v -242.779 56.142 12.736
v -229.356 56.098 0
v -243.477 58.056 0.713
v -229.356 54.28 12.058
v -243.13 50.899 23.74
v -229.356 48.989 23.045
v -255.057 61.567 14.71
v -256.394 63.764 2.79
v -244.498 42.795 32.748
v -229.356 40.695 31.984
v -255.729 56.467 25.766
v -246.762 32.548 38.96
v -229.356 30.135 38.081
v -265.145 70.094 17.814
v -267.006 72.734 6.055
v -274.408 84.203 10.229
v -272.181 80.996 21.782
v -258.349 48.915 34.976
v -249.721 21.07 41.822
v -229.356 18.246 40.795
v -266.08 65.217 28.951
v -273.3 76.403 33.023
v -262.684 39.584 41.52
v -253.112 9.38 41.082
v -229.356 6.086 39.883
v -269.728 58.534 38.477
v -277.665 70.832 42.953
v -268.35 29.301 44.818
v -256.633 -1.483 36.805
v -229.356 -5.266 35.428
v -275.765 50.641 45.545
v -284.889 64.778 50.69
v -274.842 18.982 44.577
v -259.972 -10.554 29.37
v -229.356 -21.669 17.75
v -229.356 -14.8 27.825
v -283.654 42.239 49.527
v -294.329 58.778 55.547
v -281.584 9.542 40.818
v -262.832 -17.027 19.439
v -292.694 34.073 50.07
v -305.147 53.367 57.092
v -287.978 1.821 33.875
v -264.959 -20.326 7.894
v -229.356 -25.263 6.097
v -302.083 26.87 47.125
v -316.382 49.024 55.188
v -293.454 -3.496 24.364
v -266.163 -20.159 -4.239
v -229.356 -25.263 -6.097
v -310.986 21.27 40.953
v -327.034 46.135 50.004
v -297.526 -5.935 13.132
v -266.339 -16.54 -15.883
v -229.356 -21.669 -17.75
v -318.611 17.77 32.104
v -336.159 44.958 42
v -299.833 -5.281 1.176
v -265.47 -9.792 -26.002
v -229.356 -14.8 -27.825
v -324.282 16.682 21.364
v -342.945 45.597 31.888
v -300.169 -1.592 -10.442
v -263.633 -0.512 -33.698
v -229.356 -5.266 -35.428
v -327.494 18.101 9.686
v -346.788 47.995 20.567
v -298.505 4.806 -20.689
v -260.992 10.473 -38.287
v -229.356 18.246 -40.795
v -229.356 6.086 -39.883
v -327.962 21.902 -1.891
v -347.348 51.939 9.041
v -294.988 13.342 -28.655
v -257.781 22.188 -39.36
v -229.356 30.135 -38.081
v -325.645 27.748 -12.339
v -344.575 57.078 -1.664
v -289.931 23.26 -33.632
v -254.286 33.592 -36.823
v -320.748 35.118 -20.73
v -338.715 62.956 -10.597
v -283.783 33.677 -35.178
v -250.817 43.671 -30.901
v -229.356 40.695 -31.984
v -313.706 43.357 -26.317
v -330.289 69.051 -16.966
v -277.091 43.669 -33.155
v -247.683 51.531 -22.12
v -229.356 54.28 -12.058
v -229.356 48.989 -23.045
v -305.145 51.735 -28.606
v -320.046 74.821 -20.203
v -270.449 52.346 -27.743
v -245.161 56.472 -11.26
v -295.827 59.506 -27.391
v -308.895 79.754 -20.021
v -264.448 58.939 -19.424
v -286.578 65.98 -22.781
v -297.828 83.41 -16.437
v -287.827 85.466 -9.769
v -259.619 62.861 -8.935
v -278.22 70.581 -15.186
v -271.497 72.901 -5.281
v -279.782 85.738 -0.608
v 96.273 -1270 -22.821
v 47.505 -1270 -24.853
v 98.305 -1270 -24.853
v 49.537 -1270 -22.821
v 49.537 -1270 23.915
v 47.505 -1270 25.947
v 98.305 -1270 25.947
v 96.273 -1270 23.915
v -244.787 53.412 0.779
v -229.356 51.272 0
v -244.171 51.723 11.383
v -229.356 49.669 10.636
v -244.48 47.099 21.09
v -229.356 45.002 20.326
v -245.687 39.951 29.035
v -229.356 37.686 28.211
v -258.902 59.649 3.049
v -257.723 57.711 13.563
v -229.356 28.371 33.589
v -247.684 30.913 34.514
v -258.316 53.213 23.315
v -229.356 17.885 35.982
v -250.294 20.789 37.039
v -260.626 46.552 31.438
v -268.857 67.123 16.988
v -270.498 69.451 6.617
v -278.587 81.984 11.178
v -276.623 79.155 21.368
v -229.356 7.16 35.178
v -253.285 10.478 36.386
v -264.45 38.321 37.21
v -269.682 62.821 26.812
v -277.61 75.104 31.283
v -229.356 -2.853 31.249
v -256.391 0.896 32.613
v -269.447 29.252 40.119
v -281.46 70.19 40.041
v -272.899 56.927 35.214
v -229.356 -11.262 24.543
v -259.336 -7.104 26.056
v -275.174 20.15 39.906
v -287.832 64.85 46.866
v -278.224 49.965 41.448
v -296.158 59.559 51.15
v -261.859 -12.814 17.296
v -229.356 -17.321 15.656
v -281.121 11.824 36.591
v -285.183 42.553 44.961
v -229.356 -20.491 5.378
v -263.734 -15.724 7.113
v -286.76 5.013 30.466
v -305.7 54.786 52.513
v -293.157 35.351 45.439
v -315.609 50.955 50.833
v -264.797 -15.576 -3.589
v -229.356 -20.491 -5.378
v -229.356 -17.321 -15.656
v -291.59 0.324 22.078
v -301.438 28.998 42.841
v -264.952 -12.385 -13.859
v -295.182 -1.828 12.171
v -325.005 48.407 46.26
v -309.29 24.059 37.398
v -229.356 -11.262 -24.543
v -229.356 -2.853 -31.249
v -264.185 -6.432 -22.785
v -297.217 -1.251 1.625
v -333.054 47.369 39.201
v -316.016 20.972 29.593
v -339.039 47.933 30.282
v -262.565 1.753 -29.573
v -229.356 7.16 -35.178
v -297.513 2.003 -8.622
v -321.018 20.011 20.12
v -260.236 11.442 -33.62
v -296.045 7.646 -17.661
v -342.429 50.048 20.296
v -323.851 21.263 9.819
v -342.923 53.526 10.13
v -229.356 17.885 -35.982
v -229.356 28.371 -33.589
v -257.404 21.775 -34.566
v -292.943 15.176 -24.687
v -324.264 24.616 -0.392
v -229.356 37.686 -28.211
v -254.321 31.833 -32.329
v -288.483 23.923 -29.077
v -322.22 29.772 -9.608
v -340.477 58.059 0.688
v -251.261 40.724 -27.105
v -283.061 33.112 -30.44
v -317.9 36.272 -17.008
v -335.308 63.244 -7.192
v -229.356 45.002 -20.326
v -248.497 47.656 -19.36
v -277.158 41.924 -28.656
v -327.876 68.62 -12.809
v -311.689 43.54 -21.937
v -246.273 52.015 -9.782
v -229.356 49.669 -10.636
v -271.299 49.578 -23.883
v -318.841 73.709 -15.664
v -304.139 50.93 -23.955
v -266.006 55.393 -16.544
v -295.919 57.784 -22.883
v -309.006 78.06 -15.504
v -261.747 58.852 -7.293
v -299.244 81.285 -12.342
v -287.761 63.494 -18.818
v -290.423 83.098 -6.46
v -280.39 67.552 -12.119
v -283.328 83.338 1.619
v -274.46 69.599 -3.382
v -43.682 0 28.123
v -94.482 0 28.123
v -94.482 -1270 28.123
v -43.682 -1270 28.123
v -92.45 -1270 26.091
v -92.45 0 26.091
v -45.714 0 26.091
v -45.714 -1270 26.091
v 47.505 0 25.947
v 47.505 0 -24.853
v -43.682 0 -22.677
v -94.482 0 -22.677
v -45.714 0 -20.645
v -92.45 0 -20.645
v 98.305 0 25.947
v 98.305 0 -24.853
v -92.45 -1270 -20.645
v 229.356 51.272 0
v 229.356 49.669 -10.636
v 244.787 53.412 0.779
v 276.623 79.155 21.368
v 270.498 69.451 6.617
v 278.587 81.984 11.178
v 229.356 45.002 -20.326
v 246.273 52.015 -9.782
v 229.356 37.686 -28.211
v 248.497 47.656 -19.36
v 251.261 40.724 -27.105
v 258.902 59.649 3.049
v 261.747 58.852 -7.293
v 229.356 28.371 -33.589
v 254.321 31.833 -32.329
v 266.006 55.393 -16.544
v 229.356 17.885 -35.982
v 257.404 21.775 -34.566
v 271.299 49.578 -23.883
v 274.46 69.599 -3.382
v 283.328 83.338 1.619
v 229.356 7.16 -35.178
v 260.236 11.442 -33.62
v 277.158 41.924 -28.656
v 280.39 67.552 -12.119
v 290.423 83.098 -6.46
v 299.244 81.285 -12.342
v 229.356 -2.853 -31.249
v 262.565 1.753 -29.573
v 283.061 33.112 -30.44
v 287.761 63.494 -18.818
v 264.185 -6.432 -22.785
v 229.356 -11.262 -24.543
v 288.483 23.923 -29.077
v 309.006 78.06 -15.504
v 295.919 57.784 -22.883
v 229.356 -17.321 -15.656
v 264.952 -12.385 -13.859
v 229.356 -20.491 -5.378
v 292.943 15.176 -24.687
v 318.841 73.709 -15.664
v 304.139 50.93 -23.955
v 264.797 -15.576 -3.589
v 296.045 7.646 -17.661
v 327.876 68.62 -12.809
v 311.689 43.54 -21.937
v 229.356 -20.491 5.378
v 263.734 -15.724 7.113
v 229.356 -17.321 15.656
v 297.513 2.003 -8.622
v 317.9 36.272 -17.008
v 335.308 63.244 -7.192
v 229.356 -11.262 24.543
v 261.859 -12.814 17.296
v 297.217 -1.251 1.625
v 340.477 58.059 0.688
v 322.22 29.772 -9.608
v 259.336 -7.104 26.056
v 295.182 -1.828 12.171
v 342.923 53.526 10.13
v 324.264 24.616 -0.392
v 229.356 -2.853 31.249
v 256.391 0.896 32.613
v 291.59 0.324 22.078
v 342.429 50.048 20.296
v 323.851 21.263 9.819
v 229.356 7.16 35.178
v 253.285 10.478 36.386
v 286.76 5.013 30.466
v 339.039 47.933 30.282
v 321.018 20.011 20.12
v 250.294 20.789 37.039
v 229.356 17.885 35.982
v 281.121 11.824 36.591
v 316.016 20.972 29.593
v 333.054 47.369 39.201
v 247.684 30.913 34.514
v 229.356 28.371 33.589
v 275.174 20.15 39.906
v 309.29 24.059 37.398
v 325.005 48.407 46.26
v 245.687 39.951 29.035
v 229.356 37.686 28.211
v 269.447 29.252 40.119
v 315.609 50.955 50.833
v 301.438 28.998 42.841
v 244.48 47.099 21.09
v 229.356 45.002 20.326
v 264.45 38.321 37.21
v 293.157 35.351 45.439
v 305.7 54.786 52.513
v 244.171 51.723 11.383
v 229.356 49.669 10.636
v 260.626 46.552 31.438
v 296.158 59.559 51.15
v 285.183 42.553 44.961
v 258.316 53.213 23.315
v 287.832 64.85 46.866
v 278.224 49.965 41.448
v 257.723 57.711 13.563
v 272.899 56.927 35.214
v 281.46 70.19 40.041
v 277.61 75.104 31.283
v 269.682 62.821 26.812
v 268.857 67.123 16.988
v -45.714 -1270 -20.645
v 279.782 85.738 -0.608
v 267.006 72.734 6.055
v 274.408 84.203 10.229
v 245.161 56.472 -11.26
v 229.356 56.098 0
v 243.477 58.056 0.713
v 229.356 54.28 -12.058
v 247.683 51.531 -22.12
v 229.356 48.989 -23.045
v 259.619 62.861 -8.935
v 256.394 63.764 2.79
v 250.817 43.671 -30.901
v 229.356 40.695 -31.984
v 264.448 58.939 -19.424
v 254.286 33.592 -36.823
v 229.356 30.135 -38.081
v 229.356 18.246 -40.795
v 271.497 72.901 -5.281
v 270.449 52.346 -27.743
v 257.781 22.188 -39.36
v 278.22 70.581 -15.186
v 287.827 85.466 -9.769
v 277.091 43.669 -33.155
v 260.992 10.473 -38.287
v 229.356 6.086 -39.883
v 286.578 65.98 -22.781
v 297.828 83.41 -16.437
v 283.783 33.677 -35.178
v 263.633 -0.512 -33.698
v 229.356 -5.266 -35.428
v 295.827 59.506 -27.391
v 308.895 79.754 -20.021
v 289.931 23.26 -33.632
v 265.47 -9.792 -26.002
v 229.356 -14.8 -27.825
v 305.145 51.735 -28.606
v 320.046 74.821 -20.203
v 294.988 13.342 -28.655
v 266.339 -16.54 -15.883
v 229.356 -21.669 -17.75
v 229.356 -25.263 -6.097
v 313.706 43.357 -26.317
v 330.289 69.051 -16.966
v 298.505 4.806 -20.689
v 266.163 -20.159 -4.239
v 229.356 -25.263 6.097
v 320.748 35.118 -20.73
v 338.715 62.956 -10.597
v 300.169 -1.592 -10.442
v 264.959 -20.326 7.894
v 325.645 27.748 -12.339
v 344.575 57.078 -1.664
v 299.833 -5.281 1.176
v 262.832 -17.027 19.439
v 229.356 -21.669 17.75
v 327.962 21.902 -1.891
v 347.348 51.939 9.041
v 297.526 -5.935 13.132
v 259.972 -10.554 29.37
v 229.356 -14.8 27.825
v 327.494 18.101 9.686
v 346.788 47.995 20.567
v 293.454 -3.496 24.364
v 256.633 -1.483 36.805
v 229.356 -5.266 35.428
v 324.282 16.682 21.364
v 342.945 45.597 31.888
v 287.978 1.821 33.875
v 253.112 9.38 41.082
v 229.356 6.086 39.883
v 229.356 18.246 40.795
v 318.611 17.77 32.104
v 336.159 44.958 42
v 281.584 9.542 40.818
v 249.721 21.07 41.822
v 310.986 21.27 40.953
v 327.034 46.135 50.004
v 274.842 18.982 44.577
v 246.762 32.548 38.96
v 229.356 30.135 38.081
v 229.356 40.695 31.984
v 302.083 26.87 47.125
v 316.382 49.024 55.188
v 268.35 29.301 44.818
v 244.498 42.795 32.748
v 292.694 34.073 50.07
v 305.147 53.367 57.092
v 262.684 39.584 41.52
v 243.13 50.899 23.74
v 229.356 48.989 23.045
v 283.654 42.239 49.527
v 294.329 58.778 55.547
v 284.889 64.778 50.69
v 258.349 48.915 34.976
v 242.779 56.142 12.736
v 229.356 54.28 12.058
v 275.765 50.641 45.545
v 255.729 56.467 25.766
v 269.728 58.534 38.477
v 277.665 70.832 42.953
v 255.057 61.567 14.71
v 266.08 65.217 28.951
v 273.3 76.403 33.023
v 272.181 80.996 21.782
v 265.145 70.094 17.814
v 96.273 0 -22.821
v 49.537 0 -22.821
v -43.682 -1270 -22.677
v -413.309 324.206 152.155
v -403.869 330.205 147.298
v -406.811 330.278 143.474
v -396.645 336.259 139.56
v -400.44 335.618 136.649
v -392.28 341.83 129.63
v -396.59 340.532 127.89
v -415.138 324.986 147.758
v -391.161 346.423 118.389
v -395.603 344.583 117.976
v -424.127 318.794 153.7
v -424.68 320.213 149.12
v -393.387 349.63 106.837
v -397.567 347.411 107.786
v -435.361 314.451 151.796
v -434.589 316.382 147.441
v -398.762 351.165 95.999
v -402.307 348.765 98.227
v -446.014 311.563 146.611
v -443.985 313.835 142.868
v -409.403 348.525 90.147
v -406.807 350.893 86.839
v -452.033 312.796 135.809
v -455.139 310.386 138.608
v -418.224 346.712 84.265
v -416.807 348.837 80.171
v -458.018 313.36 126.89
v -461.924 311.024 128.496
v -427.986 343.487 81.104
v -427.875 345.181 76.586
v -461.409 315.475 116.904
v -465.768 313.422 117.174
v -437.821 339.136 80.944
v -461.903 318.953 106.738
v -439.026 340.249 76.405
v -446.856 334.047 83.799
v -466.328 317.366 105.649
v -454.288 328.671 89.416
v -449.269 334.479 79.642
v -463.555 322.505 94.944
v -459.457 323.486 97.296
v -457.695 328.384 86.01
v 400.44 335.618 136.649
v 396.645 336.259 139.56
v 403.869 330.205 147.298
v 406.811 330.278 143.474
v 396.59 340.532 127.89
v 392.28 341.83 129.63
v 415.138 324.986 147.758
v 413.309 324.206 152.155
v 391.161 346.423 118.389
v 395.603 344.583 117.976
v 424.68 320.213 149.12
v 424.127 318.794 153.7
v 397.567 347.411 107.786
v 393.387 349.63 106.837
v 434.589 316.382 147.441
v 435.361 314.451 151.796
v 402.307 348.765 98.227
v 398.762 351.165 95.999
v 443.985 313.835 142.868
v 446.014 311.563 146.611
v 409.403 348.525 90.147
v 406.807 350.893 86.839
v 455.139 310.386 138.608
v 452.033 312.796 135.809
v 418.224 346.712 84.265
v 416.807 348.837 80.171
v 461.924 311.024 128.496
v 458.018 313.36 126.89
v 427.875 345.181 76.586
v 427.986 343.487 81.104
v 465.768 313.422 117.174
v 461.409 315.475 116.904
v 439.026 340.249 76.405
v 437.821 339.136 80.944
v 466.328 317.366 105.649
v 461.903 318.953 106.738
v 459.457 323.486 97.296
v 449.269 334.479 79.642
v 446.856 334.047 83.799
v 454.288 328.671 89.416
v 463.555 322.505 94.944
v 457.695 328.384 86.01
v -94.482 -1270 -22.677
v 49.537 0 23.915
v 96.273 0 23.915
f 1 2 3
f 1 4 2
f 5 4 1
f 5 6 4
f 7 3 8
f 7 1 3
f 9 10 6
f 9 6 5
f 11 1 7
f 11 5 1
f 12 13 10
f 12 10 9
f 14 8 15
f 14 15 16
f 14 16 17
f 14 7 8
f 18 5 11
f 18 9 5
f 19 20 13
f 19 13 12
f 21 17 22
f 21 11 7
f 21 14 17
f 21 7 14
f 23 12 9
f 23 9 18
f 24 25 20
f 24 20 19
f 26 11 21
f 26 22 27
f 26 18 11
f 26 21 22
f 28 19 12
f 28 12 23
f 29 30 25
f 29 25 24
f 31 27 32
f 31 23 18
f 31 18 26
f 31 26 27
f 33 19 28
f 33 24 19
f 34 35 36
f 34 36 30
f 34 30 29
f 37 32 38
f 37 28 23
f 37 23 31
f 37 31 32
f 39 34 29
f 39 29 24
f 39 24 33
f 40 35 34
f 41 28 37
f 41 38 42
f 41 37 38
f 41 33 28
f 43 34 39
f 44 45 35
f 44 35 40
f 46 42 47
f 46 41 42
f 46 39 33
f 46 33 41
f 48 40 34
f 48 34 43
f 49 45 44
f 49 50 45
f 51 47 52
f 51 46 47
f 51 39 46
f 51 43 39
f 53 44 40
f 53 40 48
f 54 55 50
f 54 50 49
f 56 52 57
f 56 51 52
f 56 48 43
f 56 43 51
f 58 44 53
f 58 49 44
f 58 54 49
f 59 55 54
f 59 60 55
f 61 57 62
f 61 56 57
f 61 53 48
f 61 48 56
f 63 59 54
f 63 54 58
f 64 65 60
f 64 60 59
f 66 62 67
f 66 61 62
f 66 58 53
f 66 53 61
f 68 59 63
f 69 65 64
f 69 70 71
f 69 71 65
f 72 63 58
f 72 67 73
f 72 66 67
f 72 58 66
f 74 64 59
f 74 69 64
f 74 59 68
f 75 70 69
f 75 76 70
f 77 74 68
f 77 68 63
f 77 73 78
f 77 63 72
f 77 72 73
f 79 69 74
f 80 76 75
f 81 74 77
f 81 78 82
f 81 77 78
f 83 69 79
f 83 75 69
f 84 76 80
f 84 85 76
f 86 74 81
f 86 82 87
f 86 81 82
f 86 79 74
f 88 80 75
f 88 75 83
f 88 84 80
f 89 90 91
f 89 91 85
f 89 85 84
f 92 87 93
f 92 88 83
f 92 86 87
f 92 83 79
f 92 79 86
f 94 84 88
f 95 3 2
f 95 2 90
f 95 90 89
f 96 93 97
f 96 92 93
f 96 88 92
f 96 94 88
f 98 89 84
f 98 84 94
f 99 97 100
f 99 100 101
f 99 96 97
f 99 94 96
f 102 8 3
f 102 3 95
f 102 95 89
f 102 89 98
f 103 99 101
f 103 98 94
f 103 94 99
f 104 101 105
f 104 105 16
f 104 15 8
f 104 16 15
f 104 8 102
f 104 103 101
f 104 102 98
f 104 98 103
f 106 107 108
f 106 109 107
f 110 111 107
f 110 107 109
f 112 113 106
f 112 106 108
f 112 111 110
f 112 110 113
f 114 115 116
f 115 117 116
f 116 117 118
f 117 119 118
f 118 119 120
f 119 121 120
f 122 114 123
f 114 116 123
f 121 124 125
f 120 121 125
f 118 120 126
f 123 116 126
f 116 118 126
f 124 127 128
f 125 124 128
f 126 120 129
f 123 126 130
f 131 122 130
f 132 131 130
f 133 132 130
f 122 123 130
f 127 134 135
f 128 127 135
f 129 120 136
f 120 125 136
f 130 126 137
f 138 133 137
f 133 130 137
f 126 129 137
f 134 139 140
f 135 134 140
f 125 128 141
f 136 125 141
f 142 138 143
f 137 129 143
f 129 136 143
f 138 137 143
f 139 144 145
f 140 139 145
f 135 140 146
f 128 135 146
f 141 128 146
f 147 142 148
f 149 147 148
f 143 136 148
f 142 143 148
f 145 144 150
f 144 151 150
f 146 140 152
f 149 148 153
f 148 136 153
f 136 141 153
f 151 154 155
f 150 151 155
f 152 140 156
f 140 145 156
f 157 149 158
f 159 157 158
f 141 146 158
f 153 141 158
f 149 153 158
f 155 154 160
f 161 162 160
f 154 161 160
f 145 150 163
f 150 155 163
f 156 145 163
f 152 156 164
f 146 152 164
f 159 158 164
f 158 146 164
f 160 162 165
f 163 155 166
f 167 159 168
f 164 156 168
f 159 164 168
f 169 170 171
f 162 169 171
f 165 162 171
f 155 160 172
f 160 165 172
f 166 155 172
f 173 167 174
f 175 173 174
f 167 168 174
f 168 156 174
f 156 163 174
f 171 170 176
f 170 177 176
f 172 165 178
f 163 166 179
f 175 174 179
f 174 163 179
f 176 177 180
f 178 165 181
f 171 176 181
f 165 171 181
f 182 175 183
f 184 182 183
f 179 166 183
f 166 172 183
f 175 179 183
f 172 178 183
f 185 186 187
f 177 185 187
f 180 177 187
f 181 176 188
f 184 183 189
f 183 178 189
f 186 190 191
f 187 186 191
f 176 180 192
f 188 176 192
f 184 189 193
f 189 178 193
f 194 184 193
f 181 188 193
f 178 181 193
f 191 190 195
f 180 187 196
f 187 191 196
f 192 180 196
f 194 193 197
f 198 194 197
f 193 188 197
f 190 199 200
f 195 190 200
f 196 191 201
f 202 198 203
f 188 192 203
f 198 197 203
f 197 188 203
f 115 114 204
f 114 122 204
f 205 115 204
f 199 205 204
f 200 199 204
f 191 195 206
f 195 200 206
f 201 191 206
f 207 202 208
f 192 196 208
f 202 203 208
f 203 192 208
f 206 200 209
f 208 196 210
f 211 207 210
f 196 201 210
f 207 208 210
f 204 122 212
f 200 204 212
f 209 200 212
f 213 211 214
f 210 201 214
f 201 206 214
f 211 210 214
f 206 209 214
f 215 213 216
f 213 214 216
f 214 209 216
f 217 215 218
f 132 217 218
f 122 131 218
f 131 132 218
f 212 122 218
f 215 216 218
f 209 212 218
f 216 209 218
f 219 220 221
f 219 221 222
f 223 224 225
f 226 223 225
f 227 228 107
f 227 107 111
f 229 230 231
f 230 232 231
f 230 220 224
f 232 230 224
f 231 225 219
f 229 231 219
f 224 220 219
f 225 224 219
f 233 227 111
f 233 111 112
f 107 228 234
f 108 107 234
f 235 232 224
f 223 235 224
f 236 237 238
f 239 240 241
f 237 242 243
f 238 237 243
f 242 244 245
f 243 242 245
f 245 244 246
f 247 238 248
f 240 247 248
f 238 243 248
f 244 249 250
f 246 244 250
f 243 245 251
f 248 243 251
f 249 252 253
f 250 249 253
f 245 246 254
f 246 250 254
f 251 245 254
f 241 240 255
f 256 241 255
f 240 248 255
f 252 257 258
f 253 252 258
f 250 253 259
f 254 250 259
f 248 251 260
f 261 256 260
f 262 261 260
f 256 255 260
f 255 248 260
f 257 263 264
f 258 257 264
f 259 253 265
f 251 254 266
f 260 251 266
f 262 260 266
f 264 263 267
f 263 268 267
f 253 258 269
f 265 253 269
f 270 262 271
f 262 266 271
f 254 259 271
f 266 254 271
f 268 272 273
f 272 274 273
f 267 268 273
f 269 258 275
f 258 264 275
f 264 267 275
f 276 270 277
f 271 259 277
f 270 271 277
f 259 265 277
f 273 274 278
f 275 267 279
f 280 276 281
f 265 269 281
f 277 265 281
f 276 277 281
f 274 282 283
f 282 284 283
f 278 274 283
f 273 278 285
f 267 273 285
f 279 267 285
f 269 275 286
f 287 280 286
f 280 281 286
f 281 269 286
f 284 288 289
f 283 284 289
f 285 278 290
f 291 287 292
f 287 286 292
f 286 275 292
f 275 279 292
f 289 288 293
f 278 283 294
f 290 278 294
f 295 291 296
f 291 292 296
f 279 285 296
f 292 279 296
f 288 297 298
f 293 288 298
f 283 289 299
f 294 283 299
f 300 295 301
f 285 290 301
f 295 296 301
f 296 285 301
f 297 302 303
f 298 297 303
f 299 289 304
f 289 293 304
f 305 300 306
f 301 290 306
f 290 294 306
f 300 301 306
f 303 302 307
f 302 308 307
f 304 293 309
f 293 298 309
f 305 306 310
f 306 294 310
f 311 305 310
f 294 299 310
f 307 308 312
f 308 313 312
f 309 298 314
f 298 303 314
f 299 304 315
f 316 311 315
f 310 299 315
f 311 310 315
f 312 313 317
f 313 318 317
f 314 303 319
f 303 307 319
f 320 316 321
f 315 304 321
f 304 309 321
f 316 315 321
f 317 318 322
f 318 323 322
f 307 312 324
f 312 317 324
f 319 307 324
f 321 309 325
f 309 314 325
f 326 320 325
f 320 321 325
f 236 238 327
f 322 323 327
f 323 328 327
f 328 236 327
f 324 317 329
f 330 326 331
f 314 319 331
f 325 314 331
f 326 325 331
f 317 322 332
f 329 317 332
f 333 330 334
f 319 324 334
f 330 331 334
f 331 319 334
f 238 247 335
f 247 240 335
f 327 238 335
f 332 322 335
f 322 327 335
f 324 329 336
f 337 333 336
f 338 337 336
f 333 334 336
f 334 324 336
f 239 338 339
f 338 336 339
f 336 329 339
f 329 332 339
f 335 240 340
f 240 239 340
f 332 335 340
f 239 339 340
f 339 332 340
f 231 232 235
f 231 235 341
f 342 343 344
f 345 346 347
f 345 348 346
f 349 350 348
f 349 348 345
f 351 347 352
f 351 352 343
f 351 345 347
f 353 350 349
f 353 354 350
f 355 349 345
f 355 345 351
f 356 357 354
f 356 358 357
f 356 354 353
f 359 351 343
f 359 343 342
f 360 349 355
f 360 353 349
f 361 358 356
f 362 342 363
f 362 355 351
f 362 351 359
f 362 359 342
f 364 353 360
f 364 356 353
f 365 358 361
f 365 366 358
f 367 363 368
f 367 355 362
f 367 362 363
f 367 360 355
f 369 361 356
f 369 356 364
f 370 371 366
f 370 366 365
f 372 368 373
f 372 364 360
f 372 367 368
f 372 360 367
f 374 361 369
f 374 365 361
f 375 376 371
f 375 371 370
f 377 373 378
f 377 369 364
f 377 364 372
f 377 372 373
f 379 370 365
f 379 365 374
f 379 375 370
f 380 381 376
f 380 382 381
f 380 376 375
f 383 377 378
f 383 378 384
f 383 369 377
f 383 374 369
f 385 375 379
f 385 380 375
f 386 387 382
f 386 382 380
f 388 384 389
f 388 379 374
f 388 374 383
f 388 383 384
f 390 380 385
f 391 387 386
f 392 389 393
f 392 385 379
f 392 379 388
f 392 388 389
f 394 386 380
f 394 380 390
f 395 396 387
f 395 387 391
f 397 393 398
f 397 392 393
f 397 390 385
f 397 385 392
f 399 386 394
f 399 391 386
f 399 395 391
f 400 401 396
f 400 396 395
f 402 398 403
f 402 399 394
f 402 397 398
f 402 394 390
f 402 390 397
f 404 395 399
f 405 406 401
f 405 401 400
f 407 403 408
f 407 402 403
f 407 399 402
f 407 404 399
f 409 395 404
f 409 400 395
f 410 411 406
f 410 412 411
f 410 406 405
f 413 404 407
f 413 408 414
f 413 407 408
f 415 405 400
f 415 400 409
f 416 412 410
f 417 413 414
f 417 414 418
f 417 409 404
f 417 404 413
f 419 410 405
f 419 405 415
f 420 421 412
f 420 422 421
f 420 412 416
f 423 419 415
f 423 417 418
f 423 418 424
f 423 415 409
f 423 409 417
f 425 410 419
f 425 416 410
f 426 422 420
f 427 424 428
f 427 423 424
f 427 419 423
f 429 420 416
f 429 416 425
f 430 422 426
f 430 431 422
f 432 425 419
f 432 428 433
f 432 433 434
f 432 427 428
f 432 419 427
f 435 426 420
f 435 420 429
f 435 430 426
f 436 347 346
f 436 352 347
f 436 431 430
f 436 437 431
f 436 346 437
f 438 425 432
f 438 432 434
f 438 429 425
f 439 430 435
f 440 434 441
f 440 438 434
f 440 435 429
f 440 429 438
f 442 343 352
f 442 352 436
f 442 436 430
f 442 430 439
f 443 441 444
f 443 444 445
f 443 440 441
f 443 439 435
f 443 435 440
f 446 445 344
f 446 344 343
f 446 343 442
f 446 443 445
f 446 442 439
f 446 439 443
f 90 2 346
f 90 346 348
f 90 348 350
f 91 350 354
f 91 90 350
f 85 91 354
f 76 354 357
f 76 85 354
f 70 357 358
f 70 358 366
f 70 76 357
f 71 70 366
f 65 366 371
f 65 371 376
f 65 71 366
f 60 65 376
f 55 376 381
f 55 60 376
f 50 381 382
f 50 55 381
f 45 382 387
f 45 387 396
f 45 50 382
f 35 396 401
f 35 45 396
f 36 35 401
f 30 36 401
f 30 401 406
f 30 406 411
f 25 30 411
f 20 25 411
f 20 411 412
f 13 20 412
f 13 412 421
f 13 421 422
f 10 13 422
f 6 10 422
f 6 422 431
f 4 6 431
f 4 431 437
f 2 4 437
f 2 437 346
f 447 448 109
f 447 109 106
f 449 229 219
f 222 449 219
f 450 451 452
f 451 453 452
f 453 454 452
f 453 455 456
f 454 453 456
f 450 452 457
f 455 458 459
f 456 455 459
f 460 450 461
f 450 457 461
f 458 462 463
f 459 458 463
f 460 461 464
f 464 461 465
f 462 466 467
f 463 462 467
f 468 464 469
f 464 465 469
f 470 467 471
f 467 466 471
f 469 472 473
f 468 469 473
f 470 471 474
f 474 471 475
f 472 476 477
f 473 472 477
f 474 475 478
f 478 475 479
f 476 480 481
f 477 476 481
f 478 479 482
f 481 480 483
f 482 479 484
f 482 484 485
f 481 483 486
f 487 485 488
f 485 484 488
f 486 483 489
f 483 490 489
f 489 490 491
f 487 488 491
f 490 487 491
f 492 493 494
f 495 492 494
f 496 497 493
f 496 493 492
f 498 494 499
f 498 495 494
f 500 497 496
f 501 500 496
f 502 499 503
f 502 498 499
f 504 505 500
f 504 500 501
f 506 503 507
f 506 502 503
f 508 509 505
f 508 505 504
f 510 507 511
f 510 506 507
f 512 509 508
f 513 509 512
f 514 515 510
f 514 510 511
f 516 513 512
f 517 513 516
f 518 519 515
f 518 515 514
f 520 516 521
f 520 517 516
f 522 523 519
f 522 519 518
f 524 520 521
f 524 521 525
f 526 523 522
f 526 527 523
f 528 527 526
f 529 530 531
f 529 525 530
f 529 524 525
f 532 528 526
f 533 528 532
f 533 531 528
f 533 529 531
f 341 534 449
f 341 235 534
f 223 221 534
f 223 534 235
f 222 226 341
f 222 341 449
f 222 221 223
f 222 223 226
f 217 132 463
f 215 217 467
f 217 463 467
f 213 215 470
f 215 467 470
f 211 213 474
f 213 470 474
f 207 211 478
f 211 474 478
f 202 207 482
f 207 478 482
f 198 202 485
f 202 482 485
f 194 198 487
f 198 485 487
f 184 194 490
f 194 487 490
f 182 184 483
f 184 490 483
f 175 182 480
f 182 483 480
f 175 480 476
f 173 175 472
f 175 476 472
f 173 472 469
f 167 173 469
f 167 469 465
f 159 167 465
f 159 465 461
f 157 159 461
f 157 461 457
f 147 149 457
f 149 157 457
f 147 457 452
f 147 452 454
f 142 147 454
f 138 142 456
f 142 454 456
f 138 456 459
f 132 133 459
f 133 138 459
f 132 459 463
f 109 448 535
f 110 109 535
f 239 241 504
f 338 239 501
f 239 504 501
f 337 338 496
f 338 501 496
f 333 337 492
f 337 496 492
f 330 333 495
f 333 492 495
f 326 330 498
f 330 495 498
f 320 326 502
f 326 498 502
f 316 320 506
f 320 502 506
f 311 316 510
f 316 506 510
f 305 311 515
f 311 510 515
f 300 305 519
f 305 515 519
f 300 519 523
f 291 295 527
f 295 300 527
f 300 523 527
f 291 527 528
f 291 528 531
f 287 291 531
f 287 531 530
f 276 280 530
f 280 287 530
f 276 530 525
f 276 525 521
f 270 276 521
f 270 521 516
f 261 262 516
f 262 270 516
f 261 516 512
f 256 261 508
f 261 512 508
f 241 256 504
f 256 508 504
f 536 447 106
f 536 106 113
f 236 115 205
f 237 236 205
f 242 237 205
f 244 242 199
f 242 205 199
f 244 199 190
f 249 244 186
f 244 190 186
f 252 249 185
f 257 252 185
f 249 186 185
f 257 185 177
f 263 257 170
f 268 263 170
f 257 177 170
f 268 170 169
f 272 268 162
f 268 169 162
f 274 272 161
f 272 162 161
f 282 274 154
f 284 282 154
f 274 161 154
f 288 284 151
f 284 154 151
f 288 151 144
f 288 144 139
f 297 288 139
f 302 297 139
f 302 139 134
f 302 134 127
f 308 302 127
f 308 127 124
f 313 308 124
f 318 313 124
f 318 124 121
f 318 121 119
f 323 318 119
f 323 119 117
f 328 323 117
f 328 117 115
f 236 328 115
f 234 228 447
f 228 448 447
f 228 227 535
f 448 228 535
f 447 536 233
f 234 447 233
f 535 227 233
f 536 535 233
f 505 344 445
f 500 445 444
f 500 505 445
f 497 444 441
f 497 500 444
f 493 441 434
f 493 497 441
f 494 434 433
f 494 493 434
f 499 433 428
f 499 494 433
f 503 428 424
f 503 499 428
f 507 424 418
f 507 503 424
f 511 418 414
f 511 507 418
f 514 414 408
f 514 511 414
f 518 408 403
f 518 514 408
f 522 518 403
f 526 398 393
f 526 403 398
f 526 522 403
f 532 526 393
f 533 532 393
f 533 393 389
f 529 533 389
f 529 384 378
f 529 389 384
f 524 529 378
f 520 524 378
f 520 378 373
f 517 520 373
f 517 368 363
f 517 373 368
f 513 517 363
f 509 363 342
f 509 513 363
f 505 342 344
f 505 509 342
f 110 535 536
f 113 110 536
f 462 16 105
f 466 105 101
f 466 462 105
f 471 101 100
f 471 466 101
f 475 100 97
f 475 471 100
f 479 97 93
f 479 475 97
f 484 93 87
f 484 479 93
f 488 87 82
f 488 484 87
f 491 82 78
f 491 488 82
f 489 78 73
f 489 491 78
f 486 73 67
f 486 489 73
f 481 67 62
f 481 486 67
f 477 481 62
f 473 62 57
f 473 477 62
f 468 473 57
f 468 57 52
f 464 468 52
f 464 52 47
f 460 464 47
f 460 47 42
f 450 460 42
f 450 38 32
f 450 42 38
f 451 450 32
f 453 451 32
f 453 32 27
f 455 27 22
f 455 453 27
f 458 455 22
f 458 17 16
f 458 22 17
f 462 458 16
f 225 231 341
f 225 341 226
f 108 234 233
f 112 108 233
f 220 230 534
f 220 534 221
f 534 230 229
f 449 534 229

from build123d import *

# Parameters (mm, degrees)
F0_W        = 50.8
F0_H        = 50.8
F0_W_2      = 46.735998857
F0_H_2      = 46.735998857
F3_DEPTH    = 1270
F4_DEPTH    = 1270
F7_R        = 40.9089605838
F7_R_2      = 36.0829606652
F8_FACE_R   = 40.9089605838
F8_FACE_R_2 = 36.0829606652


with BuildPart() as f3:
    # F0 (on Front) → F3 (new body)
    with BuildSketch(Plane.XZ):
        with Locations((-69.0816907868, 2.7228489794)):
            Rectangle(F0_W, F0_H)
        with Locations((-69.0816907868, 2.7228489794)):
            Rectangle(F0_W_2, F0_H_2, mode=Mode.SUBTRACT)
    extrude(amount=F3_DEPTH)


with BuildPart() as f4:
    # F0 (on Front) → F4 (new body)
    with BuildSketch(Plane.XZ):
        with Locations((72.9048199296, 0.5465193272)):
            Rectangle(F0_W, F0_H)
        with Locations((72.9048199296, 0.5465193272)):
            Rectangle(F0_W_2, F0_H_2, mode=Mode.SUBTRACT)
    extrude(amount=F4_DEPTH)


with BuildPart() as f8:
    # F8: sweep along a path in F5
    with BuildLine(Plane(origin=(0, 0, 0), x_dir=(1, 0, 0), z_dir=(0, -0.3420201433, 0.9396926208))) as f8_path:
        Line((229.3559585548, 0), (-229.3559585548, 0))
        ThreePointArc((-229.3559585548, 0), (-285.5495047903, 16.9545904288), (-322.9883549399, 62.1597369789))
        Line((-322.9883549399, 62.1597369789), (-441.9681850478, 344.6215098261))
    # F7 (on plane+point) → F8 (sweep)
    with BuildSketch(Plane.YZ.offset(229.3559585548)):
        with Locations((15.1888076216, 0)):
            Circle(F7_R)
        with Locations((15.1888076216, 0)):
            Circle(F7_R_2, mode=Mode.SUBTRACT)
    sweep(path=f8_path.line)

    # F9: sweep along a path in F5
    with BuildLine(Plane(origin=(0, 0, 0), x_dir=(1, 0, 0), z_dir=(0, -0.3420201433, 0.9396926208))) as f9_path:
        ThreePointArc((229.3559585548, 0), (285.5495047903, 16.9545904288), (322.9883549399, 62.1597369789))
        Line((322.9883549399, 62.1597369789), (441.9681850478, 344.6215098261))
    # F8_face (on face) → F9 (sweep)
    with BuildSketch(Plane(origin=(229.3559585548, 15.1888076216, 0), x_dir=(0, 1, 0), z_dir=(1, 0, 0))):
        Circle(F8_FACE_R)
        Circle(F8_FACE_R_2, mode=Mode.SUBTRACT)
    sweep(path=f9_path.line)


solid = Compound([f3.part, f4.part, f8.part])
